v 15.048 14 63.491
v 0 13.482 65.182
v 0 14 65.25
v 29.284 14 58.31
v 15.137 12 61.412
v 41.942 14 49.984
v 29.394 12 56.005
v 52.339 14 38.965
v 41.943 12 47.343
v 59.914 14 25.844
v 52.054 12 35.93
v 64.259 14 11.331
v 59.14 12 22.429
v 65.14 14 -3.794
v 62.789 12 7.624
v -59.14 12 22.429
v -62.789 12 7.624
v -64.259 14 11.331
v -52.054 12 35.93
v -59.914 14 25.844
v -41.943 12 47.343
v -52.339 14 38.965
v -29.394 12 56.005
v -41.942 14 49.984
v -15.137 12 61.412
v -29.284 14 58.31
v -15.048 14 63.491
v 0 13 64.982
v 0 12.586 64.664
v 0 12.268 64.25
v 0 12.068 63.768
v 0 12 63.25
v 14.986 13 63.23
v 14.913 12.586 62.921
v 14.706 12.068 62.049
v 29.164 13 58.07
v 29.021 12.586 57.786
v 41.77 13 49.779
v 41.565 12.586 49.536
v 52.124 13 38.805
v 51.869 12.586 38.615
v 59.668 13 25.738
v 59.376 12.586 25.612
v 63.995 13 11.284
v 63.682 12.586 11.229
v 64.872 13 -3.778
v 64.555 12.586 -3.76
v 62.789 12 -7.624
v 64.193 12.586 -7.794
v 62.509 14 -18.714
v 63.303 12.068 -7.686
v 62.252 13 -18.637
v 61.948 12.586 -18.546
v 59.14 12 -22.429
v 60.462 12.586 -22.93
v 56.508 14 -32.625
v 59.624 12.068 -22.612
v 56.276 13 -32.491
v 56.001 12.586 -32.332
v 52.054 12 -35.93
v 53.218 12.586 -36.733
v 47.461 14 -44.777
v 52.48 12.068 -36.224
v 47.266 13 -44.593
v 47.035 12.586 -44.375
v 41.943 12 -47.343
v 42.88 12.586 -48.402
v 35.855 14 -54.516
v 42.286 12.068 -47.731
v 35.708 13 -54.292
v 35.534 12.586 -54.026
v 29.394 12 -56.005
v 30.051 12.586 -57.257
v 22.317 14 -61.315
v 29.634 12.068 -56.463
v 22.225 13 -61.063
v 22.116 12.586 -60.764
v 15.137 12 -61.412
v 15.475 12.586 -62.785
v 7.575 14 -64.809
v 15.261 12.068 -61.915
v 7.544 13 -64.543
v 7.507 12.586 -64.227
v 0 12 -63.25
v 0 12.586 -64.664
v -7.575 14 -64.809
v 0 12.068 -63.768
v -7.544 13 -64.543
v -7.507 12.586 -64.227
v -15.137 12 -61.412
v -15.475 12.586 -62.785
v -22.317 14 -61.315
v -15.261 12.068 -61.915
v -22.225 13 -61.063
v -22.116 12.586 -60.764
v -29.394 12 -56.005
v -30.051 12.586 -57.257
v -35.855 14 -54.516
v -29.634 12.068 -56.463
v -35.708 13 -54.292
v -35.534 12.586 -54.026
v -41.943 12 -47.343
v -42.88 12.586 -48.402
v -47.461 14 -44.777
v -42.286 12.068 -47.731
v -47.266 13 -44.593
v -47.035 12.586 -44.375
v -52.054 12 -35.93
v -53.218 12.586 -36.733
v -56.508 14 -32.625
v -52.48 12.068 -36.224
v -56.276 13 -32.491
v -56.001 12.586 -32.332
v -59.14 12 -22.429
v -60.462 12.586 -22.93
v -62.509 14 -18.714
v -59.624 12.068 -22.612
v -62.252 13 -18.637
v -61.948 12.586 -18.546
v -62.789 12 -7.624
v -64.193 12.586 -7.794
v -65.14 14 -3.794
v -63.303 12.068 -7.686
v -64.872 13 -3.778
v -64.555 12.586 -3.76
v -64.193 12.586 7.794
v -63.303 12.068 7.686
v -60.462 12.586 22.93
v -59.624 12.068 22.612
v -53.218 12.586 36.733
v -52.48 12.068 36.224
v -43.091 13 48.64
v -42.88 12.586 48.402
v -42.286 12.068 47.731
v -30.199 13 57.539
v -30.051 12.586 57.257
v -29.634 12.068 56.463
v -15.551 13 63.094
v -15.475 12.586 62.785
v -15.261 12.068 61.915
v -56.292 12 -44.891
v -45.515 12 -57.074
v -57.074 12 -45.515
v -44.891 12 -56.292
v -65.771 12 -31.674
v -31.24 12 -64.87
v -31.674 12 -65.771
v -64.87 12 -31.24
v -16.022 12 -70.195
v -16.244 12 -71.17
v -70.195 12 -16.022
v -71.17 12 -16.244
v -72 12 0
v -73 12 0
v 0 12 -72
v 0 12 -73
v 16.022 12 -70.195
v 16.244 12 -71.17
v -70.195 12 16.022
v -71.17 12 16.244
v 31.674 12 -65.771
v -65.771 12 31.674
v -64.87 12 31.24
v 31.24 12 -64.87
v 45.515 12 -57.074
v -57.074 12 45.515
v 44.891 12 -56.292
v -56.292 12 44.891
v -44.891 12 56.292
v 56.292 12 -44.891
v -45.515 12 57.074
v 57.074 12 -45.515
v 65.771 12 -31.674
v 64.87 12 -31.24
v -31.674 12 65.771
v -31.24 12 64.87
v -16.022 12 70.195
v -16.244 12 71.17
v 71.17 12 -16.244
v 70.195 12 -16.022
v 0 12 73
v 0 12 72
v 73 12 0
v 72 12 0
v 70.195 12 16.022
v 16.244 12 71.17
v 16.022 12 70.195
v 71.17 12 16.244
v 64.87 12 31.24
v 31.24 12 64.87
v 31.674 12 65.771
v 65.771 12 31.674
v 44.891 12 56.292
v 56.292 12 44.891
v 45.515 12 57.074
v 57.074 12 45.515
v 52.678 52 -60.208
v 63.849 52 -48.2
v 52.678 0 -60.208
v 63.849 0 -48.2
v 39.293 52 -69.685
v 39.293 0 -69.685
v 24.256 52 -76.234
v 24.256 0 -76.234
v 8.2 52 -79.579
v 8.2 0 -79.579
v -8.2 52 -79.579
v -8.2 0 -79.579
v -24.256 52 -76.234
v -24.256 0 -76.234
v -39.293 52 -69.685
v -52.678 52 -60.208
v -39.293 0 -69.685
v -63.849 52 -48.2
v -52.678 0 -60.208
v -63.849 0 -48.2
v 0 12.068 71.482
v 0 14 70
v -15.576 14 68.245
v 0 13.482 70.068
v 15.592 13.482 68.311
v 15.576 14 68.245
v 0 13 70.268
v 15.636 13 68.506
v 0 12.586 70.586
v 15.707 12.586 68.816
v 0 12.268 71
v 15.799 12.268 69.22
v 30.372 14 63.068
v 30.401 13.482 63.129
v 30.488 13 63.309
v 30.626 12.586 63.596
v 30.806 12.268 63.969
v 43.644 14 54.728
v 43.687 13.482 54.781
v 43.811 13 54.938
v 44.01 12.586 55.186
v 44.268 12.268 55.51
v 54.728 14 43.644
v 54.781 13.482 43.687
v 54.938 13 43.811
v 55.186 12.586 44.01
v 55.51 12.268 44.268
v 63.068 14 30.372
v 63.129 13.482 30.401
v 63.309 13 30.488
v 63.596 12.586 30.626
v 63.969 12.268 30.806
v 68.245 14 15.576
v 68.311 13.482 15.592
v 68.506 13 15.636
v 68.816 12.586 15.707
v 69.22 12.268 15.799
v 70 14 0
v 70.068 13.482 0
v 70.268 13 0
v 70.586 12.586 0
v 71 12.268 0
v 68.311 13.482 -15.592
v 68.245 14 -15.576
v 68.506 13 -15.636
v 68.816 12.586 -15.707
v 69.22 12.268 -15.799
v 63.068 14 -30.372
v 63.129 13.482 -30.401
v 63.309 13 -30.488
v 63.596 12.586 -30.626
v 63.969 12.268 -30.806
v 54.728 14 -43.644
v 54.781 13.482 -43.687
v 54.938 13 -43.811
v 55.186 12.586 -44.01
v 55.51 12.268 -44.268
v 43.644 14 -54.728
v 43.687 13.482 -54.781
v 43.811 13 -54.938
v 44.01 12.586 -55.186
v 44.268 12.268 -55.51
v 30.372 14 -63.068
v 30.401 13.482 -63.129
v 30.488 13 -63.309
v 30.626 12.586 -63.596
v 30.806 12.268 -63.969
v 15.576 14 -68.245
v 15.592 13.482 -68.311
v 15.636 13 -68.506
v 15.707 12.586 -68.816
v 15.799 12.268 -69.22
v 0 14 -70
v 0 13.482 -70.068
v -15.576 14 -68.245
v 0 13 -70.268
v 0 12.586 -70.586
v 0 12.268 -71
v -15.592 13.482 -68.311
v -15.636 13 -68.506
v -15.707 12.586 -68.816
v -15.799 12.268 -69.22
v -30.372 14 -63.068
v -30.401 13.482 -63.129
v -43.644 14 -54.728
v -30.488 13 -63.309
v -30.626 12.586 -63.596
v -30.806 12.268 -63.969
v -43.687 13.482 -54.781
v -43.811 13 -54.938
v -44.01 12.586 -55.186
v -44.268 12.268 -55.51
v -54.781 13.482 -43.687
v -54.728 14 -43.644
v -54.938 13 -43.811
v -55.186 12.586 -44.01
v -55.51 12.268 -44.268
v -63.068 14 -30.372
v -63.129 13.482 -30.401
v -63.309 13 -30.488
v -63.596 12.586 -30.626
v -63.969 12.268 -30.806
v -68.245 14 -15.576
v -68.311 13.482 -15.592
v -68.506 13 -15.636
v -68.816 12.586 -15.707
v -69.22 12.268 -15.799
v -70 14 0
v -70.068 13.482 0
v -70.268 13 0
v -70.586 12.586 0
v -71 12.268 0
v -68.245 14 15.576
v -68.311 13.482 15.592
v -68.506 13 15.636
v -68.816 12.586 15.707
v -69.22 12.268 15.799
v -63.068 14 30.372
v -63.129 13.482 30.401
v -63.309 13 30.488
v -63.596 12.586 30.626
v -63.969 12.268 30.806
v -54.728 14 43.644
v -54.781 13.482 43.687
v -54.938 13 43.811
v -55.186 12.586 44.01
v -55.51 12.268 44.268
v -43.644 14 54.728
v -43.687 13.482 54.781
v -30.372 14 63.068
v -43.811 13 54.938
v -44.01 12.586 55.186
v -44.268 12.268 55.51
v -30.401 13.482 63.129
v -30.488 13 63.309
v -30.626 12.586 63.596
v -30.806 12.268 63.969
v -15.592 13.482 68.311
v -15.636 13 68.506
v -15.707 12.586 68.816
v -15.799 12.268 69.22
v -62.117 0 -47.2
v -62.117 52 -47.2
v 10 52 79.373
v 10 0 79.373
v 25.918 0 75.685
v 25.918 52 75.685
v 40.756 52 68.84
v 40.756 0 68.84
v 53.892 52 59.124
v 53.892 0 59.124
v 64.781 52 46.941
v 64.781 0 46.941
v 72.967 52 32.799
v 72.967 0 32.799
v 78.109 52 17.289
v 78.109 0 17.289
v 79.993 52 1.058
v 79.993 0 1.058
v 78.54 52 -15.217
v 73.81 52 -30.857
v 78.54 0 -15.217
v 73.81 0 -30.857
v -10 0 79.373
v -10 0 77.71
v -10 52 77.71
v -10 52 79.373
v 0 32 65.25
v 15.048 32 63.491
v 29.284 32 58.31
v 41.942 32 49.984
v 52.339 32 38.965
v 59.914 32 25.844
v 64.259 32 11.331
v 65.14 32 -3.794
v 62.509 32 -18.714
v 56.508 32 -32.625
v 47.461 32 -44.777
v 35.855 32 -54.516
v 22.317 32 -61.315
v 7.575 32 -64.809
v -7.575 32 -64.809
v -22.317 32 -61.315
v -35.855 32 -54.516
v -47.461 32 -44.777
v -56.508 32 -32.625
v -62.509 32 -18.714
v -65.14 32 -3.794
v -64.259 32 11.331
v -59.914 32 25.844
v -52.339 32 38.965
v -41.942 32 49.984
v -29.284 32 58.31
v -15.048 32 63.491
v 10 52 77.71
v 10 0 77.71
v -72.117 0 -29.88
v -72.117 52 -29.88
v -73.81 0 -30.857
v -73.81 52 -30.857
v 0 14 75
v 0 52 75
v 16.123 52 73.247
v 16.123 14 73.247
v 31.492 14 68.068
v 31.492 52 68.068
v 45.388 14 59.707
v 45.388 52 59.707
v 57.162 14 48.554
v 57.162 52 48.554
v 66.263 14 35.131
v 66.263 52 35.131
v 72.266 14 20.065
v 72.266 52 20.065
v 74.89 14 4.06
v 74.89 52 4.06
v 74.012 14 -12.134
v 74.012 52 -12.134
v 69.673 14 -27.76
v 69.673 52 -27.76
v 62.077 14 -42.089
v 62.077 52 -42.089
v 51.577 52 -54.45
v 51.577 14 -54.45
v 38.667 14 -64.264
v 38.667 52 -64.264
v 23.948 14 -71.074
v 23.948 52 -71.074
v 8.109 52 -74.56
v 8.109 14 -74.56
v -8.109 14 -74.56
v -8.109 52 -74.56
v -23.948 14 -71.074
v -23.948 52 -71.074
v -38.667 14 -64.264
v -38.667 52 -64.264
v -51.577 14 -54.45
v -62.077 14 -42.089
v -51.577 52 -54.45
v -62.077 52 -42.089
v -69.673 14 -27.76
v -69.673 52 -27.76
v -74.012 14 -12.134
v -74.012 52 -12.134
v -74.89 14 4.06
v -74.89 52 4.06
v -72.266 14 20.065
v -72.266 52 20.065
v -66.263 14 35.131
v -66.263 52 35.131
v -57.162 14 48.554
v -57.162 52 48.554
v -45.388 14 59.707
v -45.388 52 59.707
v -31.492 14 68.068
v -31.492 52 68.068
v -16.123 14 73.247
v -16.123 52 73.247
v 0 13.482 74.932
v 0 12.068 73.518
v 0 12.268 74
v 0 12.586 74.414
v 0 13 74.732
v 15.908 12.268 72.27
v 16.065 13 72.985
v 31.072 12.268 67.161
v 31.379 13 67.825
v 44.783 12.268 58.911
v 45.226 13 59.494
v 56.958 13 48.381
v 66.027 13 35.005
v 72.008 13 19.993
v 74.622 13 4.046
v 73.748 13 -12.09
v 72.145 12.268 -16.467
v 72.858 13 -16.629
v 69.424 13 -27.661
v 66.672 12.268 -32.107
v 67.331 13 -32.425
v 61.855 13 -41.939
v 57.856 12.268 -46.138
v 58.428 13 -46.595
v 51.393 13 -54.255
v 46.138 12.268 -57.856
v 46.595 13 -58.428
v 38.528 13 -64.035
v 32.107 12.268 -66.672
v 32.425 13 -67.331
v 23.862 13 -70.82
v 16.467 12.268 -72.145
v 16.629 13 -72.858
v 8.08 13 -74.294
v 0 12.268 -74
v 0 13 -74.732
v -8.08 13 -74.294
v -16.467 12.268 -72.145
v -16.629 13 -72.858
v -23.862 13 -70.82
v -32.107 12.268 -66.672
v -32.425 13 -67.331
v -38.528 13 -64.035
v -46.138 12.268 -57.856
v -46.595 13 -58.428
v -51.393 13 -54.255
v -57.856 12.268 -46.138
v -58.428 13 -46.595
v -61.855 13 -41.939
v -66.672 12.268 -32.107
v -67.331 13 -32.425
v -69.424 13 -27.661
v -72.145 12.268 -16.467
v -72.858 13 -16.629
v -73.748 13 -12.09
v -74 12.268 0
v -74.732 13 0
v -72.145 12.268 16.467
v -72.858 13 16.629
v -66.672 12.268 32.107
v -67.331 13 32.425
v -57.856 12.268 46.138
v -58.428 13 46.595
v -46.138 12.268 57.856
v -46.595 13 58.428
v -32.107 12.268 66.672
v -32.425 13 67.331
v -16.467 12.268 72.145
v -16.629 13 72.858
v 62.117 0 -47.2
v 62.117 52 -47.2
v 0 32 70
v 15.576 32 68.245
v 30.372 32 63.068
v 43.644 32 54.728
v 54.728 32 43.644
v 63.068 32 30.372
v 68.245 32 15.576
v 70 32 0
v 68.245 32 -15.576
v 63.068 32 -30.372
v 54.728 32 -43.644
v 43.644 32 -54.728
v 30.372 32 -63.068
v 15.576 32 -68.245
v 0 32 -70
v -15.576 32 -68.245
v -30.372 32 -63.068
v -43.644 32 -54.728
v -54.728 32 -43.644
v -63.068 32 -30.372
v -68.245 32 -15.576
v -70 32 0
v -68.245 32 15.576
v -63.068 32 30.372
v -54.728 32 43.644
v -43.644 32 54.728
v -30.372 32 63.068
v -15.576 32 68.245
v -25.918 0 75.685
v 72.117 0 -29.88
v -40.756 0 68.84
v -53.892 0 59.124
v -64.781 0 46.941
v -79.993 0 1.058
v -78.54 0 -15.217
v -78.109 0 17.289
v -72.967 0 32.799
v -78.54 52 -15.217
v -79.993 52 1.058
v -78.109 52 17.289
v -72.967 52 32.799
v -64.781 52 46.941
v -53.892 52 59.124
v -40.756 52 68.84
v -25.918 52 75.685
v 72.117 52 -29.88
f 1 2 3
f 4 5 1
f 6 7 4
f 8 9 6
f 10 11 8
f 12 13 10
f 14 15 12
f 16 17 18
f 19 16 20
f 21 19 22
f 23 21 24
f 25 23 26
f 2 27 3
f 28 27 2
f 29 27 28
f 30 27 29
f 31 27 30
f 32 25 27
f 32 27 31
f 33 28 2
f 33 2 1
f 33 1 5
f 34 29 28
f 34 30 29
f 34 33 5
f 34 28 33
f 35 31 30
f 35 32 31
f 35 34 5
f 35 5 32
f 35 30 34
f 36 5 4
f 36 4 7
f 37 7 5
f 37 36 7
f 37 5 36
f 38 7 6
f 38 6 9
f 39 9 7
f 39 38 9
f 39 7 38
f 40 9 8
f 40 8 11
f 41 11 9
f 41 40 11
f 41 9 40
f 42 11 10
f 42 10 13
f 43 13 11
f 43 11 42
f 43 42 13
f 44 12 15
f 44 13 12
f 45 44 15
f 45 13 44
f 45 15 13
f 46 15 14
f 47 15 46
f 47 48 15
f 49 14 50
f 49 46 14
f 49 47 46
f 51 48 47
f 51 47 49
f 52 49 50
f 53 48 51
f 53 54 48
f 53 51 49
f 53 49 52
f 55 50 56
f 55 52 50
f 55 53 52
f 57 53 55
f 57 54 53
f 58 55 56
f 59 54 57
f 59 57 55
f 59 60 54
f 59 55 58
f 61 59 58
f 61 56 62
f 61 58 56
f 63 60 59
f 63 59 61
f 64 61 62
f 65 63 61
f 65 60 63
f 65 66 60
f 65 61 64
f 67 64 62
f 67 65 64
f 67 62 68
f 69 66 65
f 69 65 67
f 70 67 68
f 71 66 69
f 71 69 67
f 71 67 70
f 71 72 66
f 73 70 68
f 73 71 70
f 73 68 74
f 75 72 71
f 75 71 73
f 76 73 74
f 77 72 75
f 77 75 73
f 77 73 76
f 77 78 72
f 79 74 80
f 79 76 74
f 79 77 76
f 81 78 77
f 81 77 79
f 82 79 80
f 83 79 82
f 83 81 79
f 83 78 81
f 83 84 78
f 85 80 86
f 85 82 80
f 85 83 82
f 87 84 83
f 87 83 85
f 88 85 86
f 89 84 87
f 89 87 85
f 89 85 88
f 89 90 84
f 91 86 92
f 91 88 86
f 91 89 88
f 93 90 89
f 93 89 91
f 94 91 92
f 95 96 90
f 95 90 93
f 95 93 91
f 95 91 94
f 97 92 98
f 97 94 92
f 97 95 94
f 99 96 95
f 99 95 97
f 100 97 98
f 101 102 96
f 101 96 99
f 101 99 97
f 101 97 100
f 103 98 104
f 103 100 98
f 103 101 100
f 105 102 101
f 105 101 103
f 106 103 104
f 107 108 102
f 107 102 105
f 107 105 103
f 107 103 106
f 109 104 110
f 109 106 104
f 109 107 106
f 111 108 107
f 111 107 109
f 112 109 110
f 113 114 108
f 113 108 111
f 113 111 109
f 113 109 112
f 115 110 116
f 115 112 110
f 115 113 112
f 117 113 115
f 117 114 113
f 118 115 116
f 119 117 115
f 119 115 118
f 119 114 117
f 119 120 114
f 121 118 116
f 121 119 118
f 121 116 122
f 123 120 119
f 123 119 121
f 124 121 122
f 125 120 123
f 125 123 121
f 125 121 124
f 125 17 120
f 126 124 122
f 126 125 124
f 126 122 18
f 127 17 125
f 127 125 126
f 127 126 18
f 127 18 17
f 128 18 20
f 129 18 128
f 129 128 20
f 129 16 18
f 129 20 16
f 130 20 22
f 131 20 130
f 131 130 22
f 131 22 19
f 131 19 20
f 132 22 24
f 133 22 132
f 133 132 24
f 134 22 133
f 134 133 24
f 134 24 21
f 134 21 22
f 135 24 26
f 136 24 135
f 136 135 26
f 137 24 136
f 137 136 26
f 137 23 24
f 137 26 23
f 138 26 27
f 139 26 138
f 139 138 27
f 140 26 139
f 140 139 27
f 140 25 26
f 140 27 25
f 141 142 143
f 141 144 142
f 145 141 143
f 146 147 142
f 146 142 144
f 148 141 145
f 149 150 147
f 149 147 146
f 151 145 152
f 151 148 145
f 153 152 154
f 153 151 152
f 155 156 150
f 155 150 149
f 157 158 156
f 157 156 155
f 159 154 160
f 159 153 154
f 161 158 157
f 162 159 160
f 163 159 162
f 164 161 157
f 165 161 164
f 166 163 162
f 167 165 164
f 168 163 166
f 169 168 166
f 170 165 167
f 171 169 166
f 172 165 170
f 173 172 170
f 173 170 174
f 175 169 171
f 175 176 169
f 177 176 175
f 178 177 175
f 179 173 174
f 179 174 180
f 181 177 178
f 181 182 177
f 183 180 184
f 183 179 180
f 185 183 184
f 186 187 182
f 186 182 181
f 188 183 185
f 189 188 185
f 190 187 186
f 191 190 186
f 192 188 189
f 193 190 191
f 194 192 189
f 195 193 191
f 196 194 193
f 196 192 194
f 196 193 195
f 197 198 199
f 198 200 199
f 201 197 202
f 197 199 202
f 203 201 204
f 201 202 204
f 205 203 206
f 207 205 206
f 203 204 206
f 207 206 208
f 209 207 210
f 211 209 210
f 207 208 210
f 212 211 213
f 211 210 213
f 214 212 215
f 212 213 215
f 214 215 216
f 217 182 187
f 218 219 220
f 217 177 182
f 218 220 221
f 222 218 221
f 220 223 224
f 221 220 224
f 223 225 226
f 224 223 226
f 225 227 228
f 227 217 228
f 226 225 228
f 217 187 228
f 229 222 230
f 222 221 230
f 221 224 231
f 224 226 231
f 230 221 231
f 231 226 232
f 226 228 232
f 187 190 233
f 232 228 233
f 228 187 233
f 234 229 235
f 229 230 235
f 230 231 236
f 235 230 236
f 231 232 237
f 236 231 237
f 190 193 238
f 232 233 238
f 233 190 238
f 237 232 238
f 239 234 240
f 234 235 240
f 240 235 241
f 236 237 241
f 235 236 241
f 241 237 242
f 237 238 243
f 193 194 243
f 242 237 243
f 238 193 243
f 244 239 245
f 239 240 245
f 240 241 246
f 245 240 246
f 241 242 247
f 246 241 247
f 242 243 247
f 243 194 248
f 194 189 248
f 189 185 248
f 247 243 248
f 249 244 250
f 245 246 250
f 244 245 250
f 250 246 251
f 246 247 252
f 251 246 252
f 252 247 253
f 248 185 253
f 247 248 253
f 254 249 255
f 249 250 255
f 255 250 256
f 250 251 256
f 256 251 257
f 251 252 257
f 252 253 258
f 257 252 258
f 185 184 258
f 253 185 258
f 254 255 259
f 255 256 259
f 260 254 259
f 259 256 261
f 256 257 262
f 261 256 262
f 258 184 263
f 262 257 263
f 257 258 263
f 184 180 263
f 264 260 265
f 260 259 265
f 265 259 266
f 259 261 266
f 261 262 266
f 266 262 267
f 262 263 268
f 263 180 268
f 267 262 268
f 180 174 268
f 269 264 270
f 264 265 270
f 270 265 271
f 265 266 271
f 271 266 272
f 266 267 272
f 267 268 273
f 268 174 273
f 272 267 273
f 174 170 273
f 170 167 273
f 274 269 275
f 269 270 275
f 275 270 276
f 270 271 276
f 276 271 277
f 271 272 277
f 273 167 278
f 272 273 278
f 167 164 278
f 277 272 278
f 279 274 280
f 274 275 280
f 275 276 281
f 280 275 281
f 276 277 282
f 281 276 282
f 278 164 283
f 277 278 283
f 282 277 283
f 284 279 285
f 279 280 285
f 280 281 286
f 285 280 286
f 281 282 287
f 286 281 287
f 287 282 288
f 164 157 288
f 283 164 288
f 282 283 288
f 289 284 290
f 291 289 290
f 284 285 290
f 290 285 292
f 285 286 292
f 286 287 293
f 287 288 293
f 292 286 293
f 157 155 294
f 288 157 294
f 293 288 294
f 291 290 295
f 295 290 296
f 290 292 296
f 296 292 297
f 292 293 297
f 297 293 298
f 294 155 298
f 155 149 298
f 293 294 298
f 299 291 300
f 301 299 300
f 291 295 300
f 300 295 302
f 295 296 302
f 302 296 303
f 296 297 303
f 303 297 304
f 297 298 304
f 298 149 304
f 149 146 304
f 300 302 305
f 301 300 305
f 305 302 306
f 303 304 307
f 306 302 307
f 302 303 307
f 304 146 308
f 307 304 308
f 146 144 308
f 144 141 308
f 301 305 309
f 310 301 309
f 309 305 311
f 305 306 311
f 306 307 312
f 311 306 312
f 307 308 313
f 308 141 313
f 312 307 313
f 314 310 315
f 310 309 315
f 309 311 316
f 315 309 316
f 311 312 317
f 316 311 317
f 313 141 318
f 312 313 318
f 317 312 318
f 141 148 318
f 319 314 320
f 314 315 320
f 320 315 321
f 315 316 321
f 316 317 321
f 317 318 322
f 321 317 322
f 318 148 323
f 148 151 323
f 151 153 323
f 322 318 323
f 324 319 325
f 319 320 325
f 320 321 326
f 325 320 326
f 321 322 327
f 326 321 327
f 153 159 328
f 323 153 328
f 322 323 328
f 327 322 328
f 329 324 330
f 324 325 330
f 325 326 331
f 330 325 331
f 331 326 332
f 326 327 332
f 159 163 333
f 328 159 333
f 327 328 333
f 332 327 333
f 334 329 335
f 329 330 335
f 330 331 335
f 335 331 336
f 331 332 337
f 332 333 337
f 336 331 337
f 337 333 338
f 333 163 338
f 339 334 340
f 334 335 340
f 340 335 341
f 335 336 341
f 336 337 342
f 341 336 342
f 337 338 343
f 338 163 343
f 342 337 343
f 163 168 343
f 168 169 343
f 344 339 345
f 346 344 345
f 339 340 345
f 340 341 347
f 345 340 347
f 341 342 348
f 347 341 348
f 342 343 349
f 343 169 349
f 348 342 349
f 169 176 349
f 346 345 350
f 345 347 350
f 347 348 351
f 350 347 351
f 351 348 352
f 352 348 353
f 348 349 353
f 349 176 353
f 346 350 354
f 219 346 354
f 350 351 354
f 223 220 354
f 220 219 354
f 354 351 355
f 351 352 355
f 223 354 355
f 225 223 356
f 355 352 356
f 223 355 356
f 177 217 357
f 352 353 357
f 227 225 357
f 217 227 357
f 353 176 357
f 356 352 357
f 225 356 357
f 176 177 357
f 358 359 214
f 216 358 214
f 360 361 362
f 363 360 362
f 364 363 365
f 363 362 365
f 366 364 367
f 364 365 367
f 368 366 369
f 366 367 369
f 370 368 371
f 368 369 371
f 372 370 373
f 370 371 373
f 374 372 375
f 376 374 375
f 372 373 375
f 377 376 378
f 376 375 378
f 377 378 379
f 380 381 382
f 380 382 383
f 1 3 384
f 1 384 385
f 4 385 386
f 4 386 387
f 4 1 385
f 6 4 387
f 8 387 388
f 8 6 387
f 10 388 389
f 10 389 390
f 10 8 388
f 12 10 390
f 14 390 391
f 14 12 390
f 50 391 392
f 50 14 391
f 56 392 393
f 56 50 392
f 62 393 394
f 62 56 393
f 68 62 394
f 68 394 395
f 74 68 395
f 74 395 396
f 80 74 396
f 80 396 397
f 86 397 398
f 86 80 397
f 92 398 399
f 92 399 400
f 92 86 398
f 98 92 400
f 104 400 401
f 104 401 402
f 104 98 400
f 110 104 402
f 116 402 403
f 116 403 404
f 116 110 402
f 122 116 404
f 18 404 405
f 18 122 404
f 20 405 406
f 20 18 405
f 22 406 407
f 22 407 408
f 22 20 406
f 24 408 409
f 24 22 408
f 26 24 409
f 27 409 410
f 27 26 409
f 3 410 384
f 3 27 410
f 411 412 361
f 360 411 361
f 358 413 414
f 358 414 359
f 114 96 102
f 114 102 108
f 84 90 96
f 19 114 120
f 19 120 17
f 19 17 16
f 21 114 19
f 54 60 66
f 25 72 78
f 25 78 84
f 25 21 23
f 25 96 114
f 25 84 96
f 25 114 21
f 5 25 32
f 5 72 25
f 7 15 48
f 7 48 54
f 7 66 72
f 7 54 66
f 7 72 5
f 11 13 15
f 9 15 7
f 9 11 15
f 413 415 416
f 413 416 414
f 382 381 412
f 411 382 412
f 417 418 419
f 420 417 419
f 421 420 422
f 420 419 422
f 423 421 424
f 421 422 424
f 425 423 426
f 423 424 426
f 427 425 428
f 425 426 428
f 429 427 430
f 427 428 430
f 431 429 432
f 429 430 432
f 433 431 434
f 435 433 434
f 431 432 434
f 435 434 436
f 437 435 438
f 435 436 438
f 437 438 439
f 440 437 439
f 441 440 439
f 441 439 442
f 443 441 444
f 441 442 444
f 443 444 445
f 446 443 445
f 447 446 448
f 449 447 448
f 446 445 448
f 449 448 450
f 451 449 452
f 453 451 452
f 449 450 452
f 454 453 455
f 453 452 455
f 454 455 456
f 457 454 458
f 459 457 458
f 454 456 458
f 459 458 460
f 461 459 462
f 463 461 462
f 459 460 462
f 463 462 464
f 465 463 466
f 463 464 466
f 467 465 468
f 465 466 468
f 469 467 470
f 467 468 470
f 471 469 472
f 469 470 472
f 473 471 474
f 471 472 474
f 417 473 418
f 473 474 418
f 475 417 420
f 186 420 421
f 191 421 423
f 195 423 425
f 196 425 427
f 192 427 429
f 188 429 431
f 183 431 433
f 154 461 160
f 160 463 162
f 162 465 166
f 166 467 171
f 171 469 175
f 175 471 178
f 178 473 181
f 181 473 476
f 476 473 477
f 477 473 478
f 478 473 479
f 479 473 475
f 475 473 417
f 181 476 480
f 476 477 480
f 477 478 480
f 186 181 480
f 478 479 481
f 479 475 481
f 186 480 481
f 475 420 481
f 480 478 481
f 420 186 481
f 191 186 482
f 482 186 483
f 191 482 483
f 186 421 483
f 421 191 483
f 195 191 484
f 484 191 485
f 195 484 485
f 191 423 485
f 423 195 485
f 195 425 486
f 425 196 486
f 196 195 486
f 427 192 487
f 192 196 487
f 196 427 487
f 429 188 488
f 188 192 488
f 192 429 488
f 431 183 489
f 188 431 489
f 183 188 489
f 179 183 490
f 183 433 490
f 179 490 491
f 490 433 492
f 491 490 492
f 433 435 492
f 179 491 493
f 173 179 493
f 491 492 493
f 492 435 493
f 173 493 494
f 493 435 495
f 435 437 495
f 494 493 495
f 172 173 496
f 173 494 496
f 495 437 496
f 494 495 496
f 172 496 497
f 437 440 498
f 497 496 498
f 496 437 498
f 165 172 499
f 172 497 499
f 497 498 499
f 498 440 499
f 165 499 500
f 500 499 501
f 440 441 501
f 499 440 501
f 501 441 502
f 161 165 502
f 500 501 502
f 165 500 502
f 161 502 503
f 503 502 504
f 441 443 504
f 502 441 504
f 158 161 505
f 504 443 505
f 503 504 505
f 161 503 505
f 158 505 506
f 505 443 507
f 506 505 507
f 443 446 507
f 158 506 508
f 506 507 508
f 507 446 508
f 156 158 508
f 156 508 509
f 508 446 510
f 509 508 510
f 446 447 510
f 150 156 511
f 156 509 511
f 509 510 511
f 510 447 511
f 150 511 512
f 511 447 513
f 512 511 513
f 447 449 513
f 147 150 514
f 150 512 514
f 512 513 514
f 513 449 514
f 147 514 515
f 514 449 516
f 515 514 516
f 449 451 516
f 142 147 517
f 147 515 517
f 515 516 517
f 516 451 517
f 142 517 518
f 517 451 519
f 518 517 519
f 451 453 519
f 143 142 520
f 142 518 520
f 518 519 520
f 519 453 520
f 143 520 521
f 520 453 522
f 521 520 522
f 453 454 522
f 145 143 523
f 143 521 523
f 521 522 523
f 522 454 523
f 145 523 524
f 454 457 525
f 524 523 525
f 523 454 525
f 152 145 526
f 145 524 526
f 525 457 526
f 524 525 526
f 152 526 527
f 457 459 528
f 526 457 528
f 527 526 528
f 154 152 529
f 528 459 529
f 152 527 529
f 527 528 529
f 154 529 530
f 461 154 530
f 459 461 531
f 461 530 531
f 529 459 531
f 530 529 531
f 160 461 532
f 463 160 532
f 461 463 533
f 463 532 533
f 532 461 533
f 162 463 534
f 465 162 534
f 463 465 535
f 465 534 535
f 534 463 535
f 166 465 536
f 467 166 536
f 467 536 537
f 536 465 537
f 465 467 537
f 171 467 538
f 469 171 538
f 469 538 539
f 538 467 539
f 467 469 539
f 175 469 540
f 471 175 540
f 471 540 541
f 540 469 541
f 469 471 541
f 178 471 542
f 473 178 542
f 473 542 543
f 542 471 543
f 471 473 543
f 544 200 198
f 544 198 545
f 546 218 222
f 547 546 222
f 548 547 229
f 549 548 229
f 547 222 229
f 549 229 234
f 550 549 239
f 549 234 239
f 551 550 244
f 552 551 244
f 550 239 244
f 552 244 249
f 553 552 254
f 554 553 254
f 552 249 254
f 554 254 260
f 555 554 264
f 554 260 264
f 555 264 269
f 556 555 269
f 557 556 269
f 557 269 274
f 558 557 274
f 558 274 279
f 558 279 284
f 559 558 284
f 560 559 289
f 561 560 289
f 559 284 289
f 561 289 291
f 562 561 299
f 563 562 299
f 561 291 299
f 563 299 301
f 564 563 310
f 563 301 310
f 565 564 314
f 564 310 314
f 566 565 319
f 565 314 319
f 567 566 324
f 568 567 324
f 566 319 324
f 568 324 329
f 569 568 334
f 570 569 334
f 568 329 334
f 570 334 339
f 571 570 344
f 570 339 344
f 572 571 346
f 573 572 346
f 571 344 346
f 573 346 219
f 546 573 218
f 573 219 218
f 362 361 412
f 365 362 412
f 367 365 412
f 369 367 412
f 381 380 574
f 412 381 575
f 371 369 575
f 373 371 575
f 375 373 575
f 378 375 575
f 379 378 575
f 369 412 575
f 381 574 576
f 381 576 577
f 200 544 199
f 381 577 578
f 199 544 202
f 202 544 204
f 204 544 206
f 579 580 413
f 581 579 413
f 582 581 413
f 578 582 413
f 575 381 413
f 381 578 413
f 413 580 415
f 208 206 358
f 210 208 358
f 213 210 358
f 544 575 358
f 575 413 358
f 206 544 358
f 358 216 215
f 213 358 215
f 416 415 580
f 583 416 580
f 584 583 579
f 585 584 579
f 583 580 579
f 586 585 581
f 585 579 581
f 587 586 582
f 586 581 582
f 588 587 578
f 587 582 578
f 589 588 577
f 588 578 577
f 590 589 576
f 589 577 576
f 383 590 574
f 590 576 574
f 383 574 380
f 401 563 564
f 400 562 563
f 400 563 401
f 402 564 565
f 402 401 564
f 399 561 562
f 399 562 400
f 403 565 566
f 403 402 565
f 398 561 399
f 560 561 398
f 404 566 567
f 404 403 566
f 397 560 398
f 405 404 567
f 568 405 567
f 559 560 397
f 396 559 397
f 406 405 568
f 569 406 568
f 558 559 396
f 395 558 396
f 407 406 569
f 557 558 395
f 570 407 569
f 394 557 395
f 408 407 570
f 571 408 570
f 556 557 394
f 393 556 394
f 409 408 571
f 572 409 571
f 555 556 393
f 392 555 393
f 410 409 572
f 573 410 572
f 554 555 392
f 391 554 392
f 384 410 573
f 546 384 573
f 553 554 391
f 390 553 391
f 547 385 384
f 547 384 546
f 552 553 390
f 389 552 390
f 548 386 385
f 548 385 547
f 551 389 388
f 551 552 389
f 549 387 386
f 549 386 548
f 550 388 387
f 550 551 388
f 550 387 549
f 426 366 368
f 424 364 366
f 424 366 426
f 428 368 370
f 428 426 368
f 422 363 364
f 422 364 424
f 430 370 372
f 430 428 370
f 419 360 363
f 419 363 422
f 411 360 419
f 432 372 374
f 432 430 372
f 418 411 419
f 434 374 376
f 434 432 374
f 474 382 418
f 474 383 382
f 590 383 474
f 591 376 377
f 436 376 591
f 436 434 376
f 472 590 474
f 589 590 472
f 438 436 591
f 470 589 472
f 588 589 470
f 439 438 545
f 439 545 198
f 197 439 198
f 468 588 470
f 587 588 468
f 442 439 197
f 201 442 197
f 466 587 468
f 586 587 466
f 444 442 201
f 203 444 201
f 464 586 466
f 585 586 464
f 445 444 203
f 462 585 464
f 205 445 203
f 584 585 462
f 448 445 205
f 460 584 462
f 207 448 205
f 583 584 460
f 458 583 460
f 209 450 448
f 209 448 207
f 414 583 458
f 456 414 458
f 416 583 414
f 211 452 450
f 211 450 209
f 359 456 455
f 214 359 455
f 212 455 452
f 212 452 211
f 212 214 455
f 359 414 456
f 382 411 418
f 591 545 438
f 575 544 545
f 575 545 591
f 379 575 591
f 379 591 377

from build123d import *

# Parameters (mm, degrees)
SZKIC2_R                    = 80
DODANIE_WYCI_GNI_CIE1_DEPTH = 52
SZKIC3_R                    = 75
WYTNIJ_WYCI_GNI_CIE1_DEPTH  = 40
SZKIC4_R                    = 70
SZKIC4_R_2                  = 65.25
DODANIE_WYCI_GNI_CIE3_DEPTH = 20
ZAOKR_GLENIE4_R             = 2
ZAOKR_GLENIE5_R             = 2
SZKIC5_W                    = 20
SZKIC5_H                    = 20
WYTNIJ_WYCI_GNI_CIE3_DEPTH  = 125.51505933


with BuildPart() as part:
    # Szkic2 → Dodanie-wyciągnięcie1 (new body)
    with BuildSketch(Plane(origin=(0, 0, 0), x_dir=(1, 0, 0), z_dir=(0, 1, 0))):
        with Locations(Location((0, 0, 0), (0, 0, 90))):
            Circle(SZKIC2_R)
    extrude(amount=DODANIE_WYCI_GNI_CIE1_DEPTH)

    # Szkic3 → Wytnij-wyciągnięcie1 (cut)
    with BuildSketch(Plane(origin=(0, 52, 0), x_dir=(1, 0, 0), z_dir=(0, 1, 0))):
        with Locations(Location((0, 0, 0), (0, 0, 270))):
            Circle(SZKIC3_R)
    extrude(amount=-WYTNIJ_WYCI_GNI_CIE1_DEPTH, mode=Mode.SUBTRACT)

    # Szkic4 → Dodanie-wyciągnięcie3 (add)
    with BuildSketch(Plane(origin=(0, 12, 0), x_dir=(1, 0, 0), z_dir=(0, 1, 0))):
        with Locations(Location((0, 0, 0), (0, 0, 270))):
            Circle(SZKIC4_R)
        with Locations(Location((0, 0, 0), (0, 0, 270))):
            Circle(SZKIC4_R_2, mode=Mode.SUBTRACT)
    extrude(amount=DODANIE_WYCI_GNI_CIE3_DEPTH)

    # Zaokrąglenie4
    zaokr_glenie4_edges = [part.edges().sort_by_distance(p)[0] for p in [
        (0, 12, -65.25),
    ]]
    fillet(zaokr_glenie4_edges, radius=ZAOKR_GLENIE4_R)

    # Zaokrąglenie5
    zaokr_glenie5_edges = [part.edges().sort_by_distance(p)[0] for p in [
        (0, 12, -70),
        (0, 12, -75),
    ]]
    fillet(zaokr_glenie5_edges, radius=ZAOKR_GLENIE5_R)

    # Szkic5 → Wytnij-wyciągnięcie3 (cut, through all)
    with BuildSketch(Plane.XZ):
        Polygon((72.116968793, -29.879745962), (89.437476869, -39.879745962), (79.437476869, -57.200254038), (62.116968793, -47.200254038), align=None)
        with Locations((0, 87.71)):
            Rectangle(SZKIC5_W, SZKIC5_H)
        Polygon((-62.116968793, -47.200254038), (-79.437476869, -57.200254038), (-89.437476869, -39.879745962), (-72.116968793, -29.879745962), align=None)
    extrude(amount=-WYTNIJ_WYCI_GNI_CIE3_DEPTH, mode=Mode.SUBTRACT)


solid = part.part
